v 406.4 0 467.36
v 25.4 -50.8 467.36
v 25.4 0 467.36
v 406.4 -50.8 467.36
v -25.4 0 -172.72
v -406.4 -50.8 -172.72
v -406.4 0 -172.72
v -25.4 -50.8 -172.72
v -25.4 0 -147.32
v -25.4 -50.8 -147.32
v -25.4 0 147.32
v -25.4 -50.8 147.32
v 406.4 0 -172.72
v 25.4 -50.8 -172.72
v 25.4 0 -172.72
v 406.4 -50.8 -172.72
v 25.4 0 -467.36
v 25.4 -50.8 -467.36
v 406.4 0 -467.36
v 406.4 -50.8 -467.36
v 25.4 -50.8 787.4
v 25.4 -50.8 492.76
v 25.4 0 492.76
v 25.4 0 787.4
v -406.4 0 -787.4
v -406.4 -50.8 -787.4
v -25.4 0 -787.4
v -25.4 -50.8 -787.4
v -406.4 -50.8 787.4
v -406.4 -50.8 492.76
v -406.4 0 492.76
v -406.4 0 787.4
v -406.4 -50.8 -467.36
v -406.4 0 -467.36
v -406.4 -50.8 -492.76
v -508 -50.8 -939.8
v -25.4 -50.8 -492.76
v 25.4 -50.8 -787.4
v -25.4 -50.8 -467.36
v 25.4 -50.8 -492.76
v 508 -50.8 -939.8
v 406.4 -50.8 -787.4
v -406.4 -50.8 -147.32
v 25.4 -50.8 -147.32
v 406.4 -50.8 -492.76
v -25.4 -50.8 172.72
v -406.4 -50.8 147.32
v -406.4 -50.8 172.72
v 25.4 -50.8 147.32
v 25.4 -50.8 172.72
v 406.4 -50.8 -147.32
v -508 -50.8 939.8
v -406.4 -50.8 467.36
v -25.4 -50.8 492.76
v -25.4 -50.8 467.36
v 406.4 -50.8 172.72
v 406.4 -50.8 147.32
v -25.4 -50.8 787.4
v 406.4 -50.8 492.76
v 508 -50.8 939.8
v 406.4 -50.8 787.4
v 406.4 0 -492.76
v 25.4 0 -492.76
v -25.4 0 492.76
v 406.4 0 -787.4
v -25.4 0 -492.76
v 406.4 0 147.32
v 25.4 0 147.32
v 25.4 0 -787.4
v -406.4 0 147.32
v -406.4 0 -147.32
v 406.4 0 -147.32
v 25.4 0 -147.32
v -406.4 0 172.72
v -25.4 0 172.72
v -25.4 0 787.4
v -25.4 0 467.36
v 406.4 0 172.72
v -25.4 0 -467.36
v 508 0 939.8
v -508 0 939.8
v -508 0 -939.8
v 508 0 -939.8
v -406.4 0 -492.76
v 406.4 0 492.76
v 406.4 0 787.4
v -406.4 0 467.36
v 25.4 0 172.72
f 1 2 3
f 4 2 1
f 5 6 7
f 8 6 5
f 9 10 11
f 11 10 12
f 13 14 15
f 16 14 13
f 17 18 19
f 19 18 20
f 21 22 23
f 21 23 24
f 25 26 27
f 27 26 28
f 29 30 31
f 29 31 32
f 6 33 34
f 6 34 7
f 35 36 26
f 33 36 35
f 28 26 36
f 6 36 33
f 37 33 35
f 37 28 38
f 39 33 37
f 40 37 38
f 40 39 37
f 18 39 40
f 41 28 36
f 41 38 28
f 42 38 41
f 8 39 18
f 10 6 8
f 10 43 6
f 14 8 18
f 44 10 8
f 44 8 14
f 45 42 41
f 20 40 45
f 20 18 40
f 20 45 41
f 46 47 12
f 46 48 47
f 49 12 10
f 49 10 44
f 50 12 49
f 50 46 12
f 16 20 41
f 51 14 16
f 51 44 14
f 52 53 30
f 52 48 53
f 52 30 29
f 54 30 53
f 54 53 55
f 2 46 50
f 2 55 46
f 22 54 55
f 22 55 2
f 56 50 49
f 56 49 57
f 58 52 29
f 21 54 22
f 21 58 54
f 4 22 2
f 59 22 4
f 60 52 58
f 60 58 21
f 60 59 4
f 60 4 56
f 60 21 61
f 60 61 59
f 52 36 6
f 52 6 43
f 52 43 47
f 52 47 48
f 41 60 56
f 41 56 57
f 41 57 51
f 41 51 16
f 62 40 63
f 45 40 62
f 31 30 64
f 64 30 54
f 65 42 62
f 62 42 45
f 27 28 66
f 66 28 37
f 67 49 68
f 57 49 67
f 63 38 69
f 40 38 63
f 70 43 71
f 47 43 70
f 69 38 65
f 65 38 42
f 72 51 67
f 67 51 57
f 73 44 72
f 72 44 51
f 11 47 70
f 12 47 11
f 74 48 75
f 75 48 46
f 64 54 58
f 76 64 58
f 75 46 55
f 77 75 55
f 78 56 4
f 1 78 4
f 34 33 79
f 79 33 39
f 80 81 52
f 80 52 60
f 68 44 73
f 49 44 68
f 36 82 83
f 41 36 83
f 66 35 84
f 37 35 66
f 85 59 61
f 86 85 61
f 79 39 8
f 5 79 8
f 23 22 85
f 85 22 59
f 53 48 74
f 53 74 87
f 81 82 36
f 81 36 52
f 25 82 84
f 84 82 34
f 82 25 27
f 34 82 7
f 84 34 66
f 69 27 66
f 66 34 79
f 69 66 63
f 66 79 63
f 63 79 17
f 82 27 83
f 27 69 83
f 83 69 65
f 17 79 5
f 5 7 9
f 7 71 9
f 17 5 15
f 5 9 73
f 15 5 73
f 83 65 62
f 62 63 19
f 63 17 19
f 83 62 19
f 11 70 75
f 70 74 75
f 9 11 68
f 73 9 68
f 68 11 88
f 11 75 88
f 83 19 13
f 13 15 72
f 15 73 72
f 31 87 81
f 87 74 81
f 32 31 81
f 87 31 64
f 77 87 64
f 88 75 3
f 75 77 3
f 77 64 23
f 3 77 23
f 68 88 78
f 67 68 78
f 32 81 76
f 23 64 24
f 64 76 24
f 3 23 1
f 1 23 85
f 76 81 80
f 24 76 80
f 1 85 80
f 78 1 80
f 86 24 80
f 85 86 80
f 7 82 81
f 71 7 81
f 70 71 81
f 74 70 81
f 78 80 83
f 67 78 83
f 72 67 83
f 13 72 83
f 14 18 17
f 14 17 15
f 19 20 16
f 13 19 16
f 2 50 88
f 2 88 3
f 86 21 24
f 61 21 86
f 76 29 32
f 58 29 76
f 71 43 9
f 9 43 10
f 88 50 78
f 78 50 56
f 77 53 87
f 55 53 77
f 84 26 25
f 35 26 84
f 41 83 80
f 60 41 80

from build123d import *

# Parameters (mm, degrees)
F0_W     = 1016
F0_H     = 1879.6
F1_DEPTH = 50.8
F2_W     = 381
F2_H     = 294.64
F3_DEPTH = 50.801


with BuildPart() as f1:
    # F0 (on Front) → F1 (new body)
    with BuildSketch(Plane.XZ):
        Rectangle(F0_W, F0_H)
    extrude(amount=F1_DEPTH)

    # F2 (on face) → F3 (cut, through all)
    with BuildSketch(Plane.XZ.offset(50.8)):
        with Locations((-215.9, 640.08)):
            Rectangle(F2_W, F2_H)
        with Locations((-215.9, 320.04)):
            Rectangle(F2_W, F2_H)
        with Locations((-215.9, 0)):
            Rectangle(F2_W, F2_H)
        with Locations((-215.9, -320.04)):
            Rectangle(F2_W, F2_H)
        with Locations((-215.9, -640.08)):
            Rectangle(F2_W, F2_H)
        with Locations((215.9, 320.04)):
            Rectangle(F2_W, F2_H)
        with Locations((215.9, 640.08)):
            Rectangle(F2_W, F2_H)
        with Locations((215.9, 0)):
            Rectangle(F2_W, F2_H)
        with Locations((215.9, -320.04)):
            Rectangle(F2_W, F2_H)
        with Locations((215.9, -640.08)):
            Rectangle(F2_W, F2_H)
    extrude(amount=-F3_DEPTH, mode=Mode.SUBTRACT)


solid = f1.part
